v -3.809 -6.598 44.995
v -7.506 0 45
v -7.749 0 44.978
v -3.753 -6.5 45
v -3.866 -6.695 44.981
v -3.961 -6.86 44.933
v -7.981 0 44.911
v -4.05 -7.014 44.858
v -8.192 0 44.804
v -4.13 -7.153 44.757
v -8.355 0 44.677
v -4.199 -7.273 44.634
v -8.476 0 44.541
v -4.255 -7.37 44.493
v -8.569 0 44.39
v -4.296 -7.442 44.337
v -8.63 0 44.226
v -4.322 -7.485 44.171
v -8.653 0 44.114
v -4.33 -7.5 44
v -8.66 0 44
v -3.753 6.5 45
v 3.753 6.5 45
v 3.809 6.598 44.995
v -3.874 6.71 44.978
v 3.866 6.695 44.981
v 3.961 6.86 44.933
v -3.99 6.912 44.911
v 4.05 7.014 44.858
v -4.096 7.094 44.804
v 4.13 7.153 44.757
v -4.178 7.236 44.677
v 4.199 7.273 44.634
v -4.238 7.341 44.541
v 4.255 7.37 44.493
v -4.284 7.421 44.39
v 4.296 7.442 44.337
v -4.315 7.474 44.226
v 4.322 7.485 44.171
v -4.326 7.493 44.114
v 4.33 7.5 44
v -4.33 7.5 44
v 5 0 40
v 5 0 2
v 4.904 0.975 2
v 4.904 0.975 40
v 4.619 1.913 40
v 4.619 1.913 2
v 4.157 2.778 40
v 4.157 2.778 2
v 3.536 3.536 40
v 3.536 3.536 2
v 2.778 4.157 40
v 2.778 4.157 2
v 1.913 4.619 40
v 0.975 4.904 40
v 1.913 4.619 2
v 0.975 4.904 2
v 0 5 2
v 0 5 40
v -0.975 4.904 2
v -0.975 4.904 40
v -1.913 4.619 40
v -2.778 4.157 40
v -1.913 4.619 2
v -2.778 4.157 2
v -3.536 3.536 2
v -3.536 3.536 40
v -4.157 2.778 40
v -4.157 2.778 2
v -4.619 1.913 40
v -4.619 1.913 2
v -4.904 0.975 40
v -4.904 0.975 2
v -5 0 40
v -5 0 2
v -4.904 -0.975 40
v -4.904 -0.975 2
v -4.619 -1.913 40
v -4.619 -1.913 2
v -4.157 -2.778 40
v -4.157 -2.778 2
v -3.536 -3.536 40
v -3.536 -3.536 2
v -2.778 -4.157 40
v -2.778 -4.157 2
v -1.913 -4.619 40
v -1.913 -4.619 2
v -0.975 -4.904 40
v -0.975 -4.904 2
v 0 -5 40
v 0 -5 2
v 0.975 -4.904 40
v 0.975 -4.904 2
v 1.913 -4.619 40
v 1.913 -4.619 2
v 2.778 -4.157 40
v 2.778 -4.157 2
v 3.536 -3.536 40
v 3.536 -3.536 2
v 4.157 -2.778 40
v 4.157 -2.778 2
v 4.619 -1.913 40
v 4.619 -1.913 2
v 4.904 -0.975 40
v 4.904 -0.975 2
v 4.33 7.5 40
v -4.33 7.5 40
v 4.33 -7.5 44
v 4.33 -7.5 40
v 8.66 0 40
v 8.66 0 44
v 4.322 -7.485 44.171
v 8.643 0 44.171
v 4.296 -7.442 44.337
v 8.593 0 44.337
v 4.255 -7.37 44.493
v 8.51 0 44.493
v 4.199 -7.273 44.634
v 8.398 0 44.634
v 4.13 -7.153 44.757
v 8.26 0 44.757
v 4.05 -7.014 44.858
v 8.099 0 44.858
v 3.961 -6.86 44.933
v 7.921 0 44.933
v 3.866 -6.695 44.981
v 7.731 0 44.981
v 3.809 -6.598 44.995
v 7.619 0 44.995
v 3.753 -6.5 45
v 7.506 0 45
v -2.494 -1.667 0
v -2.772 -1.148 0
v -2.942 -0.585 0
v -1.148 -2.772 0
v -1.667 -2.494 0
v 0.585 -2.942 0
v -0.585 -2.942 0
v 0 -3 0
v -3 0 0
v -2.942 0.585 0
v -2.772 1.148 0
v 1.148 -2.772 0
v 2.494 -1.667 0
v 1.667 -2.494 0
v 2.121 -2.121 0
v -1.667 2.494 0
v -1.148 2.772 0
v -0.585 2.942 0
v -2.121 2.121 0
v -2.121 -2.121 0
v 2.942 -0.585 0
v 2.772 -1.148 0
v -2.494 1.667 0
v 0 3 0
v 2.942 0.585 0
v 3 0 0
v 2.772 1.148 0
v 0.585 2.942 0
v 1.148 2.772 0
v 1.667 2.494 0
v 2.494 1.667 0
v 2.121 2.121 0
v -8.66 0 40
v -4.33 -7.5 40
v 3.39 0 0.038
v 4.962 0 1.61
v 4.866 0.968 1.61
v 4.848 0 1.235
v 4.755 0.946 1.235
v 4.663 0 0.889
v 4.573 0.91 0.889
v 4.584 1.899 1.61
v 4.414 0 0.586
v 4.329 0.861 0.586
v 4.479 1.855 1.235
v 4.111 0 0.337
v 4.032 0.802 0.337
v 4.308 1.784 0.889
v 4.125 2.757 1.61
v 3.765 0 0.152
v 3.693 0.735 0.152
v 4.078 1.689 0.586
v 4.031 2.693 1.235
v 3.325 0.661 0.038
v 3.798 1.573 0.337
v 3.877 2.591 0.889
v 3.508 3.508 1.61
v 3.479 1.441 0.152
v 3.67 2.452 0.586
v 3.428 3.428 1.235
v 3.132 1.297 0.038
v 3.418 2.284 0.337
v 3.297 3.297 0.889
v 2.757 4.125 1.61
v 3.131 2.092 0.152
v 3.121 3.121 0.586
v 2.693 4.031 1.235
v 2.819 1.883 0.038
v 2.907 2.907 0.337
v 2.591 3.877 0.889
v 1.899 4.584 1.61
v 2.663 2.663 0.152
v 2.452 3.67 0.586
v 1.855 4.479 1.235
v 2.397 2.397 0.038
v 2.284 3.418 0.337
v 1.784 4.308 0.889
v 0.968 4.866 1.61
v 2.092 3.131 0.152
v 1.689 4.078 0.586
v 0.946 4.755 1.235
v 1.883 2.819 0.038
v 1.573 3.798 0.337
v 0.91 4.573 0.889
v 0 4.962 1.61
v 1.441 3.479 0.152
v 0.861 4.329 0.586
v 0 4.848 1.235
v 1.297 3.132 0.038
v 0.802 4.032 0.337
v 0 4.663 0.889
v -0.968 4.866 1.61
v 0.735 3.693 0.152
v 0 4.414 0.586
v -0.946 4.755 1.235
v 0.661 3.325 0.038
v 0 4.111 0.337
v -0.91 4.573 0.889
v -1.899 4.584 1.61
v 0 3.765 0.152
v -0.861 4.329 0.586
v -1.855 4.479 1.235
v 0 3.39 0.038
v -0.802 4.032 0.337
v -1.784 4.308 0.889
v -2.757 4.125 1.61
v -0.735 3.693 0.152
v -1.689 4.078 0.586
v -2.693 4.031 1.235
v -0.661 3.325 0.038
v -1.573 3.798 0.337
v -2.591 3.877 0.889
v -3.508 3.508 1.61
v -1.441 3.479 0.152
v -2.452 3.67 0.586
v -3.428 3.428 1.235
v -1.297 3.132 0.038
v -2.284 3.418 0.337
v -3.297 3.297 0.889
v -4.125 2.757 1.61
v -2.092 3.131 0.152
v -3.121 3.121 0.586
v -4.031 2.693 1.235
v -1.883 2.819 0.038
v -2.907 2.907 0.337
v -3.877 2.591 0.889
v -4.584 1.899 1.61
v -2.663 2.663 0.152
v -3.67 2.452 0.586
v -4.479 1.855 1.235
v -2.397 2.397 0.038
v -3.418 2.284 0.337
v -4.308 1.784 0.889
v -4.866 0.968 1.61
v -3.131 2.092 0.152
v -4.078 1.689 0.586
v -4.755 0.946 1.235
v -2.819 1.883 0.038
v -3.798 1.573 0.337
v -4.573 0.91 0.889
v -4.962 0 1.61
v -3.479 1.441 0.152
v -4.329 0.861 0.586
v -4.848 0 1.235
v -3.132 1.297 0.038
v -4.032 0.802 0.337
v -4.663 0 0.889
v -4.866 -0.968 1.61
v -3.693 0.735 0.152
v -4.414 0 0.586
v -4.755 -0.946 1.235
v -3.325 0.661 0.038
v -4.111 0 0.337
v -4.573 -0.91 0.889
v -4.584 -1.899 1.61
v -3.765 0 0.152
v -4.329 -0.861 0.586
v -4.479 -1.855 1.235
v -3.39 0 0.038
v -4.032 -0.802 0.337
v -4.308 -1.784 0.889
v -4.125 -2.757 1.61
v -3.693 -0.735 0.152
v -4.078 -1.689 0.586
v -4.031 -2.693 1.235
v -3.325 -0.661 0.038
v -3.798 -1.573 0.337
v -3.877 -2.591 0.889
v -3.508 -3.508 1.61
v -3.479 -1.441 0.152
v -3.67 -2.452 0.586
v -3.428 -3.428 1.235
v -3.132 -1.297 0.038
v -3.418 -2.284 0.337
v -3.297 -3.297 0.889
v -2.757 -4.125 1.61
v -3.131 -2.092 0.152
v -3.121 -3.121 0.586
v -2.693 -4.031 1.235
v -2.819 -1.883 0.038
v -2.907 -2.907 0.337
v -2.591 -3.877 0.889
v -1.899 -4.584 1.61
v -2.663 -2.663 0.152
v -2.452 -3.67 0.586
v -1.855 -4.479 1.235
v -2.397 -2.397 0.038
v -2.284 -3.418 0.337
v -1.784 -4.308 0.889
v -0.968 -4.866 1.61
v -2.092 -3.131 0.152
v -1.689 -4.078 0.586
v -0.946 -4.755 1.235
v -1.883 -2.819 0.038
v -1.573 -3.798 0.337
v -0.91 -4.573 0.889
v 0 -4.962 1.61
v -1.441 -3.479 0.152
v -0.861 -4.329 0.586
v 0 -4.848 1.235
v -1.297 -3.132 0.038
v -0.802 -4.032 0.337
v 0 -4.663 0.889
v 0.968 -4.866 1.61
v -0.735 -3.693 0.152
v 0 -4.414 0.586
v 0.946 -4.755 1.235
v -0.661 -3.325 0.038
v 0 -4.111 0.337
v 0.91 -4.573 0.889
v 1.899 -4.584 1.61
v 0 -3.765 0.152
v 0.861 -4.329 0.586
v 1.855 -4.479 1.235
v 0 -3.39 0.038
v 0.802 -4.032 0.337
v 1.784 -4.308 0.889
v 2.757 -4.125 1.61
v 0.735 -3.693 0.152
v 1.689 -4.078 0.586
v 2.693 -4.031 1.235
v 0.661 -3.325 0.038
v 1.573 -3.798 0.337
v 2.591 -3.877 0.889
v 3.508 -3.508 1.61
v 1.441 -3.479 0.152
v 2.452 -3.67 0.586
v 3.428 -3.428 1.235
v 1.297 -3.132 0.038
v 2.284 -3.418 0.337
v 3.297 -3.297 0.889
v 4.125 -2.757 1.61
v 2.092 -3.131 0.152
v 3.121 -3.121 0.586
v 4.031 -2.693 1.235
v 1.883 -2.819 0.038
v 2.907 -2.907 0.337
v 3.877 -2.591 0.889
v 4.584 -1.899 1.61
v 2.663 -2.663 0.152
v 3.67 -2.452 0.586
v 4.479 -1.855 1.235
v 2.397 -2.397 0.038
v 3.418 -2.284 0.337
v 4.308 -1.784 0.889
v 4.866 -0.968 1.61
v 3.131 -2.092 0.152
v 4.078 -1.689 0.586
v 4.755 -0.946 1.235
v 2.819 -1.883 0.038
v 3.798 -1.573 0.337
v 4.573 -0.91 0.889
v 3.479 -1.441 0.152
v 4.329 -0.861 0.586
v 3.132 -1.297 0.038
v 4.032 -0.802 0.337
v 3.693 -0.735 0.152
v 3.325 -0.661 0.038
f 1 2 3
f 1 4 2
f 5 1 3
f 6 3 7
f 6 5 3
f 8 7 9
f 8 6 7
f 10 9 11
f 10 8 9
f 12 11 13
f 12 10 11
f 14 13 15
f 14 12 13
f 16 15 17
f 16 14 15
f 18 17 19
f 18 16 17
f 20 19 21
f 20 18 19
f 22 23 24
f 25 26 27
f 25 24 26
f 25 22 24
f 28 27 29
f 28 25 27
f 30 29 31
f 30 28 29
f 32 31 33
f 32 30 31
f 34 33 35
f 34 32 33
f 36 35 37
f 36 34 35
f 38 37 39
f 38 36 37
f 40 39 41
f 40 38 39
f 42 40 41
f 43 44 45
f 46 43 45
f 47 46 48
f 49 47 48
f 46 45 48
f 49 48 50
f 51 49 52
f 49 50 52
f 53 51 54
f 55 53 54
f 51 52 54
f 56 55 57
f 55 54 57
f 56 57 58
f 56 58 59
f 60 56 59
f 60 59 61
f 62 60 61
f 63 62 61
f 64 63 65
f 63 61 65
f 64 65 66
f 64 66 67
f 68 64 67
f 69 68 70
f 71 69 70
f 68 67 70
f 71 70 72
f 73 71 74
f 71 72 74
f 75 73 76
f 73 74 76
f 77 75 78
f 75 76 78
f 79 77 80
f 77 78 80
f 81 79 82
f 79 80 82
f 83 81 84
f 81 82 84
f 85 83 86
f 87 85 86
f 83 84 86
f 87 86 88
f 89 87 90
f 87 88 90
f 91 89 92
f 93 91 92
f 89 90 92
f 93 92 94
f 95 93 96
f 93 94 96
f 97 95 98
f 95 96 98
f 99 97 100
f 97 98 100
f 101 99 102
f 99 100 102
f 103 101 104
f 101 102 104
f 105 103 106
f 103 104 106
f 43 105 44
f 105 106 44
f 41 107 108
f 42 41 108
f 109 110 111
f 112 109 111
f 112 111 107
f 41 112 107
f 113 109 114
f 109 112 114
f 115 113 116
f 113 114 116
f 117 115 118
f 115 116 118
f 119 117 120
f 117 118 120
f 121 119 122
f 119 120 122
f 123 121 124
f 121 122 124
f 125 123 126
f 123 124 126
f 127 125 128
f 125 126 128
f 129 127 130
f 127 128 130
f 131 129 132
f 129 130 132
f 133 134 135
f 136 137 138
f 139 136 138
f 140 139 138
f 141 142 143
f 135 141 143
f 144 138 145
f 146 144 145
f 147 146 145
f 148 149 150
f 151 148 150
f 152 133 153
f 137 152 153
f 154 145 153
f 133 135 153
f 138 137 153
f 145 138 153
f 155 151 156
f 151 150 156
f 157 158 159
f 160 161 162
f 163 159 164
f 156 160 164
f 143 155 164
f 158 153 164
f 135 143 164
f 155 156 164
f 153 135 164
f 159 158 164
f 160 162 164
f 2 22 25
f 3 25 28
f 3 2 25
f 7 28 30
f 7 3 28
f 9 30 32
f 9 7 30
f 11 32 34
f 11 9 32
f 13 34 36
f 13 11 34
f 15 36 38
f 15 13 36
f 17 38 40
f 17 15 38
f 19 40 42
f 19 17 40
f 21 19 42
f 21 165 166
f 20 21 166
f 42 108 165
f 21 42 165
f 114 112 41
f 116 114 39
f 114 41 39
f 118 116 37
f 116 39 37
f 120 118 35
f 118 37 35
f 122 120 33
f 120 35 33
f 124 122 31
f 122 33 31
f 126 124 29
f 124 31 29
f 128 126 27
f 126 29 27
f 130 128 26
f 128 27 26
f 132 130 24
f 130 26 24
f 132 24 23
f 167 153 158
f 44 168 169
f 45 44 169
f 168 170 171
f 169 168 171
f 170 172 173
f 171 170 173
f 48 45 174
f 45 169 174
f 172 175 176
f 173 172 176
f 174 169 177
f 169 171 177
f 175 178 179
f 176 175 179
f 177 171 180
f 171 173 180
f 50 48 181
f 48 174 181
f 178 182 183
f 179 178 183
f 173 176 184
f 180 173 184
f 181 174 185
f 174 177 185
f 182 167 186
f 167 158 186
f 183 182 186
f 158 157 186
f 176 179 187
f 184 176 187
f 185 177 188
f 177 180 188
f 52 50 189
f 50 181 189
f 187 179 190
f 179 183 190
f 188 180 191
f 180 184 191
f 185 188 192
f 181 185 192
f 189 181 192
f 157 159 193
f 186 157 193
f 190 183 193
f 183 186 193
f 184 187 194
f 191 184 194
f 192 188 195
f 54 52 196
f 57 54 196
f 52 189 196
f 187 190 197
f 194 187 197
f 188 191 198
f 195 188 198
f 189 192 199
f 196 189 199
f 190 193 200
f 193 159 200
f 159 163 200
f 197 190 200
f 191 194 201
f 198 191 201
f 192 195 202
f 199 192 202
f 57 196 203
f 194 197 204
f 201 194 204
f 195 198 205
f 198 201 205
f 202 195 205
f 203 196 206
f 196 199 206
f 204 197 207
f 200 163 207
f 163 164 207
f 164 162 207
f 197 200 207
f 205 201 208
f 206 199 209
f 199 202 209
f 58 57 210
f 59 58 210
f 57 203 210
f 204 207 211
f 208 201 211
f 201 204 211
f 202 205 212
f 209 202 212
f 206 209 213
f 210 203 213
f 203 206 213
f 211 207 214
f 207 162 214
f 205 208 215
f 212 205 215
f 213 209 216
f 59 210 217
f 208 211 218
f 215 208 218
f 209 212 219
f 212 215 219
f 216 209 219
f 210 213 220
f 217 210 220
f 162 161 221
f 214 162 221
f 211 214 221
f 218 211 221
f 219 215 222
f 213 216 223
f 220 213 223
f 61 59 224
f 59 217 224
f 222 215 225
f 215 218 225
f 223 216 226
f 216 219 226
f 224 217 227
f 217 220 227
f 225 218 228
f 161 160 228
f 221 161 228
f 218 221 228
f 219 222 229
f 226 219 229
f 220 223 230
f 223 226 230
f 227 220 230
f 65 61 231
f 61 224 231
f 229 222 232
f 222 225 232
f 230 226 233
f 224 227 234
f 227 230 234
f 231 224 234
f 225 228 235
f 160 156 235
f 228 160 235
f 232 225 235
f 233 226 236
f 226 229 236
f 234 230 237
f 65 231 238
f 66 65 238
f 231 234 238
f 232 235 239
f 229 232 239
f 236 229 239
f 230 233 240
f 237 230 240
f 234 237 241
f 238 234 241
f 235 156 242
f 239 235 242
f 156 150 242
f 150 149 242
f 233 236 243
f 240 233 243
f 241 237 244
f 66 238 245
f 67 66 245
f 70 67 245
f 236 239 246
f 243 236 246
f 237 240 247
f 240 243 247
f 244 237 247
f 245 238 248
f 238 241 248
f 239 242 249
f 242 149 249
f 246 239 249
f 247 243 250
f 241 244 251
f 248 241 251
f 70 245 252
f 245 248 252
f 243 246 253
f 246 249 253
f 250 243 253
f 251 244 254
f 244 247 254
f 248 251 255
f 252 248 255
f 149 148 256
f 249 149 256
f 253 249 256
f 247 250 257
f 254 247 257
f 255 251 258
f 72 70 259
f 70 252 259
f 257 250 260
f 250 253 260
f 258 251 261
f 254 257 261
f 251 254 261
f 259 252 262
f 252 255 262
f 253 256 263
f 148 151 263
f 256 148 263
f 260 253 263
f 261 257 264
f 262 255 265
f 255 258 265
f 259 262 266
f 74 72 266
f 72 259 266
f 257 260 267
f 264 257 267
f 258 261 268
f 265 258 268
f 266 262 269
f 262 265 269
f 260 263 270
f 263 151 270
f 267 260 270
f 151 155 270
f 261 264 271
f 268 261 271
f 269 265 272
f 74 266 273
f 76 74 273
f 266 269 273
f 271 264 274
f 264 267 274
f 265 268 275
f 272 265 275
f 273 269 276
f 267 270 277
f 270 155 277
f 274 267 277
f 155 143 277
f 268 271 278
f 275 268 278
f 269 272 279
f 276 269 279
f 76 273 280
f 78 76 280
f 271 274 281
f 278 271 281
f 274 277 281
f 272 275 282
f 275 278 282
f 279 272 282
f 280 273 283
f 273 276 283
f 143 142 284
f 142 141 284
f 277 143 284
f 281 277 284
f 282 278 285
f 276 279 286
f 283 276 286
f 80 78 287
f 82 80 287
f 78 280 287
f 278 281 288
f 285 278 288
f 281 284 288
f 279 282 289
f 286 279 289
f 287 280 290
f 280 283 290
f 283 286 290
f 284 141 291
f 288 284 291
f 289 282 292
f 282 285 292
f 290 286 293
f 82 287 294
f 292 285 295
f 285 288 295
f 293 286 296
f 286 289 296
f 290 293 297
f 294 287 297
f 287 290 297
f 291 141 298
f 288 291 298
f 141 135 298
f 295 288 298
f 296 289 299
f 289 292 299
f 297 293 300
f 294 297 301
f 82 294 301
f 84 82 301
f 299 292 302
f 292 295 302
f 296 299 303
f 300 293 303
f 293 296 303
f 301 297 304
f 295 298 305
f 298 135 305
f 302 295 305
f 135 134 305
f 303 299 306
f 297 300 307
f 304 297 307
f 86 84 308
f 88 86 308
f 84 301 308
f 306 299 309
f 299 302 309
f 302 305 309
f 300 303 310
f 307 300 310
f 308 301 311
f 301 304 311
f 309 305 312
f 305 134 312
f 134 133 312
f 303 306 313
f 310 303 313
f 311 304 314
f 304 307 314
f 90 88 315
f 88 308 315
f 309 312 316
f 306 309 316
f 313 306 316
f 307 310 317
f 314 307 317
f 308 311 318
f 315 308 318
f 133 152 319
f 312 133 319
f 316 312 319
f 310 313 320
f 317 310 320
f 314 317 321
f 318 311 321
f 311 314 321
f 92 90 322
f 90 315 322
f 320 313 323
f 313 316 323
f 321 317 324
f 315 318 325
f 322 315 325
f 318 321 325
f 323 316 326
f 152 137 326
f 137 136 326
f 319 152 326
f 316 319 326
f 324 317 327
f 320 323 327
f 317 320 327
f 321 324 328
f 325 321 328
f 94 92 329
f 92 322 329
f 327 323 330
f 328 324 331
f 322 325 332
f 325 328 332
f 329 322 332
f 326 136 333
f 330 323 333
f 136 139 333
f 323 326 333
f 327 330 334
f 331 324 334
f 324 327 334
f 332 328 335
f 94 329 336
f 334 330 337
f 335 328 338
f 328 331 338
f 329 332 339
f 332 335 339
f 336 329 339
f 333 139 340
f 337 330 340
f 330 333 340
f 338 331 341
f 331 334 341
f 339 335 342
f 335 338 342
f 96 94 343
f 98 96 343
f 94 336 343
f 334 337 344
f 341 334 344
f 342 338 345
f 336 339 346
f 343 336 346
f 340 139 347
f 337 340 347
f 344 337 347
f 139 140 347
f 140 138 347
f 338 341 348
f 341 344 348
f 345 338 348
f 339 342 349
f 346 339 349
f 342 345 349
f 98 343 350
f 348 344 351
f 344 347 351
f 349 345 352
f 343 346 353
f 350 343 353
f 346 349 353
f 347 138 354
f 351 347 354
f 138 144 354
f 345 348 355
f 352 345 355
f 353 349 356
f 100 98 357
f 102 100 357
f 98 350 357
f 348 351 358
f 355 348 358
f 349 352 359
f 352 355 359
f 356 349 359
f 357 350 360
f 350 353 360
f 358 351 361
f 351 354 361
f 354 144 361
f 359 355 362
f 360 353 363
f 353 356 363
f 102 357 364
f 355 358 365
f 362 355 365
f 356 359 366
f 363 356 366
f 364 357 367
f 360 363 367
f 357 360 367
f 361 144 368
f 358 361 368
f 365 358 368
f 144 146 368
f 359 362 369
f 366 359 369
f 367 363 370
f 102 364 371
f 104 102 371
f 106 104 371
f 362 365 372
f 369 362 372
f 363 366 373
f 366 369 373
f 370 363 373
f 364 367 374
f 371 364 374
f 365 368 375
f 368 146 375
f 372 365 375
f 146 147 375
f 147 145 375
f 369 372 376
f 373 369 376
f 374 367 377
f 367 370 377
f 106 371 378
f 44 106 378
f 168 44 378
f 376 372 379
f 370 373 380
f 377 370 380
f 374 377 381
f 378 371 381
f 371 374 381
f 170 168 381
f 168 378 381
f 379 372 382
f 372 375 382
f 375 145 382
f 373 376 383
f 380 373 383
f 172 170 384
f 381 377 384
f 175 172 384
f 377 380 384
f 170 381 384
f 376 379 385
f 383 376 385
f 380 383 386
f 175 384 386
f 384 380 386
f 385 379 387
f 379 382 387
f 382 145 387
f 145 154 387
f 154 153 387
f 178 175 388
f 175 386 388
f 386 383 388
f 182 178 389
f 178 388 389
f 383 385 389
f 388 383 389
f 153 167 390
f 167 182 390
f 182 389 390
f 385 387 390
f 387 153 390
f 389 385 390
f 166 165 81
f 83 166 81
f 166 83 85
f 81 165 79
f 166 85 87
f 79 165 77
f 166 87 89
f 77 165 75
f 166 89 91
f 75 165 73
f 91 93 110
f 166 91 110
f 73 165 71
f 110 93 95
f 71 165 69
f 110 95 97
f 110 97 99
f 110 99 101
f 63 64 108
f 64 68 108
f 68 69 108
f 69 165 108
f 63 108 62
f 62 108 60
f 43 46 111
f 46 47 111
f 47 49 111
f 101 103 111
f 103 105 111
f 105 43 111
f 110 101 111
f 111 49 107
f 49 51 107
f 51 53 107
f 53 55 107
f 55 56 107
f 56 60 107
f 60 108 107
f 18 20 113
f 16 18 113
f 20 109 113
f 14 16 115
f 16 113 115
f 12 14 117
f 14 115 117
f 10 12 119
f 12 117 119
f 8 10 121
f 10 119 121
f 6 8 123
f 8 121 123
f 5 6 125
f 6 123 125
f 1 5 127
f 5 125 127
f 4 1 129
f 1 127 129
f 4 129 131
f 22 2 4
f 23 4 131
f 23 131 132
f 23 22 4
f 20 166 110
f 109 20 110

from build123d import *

# Parameters (mm, degrees)
SKETCH_1_R      = 5
EXTRUDE_1_DEPTH = 40
EXTRUDE_2_DEPTH = 5
FILLET_1_R      = 1
FILLET_2_R      = 2


with BuildPart() as part:
    # 草图1 → 凸台-拉伸1 (new body)
    with BuildSketch(Plane.XY):
        Circle(SKETCH_1_R)
    extrude(amount=EXTRUDE_1_DEPTH)

    # 草图2 → 凸台-拉伸2 (add)
    with BuildSketch(Plane.XY.offset(40)):
        Polygon((4.330127019, -7.5), (8.660254038, 0), (4.330127019, 7.5), (-4.330127019, 7.5), (-8.660254038, 0), (-4.330127019, -7.5), align=None)
    extrude(amount=EXTRUDE_2_DEPTH)

    # 圆角1
    fillet_1_edges = [part.edges().sort_by_distance(p)[0] for p in [
        (0, -7.5, 45),
        (6.495190528, -3.75, 45),
        (6.495190528, 3.75, 45),
        (0, 7.5, 45),
        (-6.495190528, 3.75, 45),
        (-6.495190528, -3.75, 45),
    ]]
    fillet(fillet_1_edges, radius=FILLET_1_R)

    # 圆角2
    fillet_2_edges = [part.edges().sort_by_distance(p)[0] for p in [
        (-5, 0, 0),
    ]]
    fillet(fillet_2_edges, radius=FILLET_2_R)


solid = part.part
